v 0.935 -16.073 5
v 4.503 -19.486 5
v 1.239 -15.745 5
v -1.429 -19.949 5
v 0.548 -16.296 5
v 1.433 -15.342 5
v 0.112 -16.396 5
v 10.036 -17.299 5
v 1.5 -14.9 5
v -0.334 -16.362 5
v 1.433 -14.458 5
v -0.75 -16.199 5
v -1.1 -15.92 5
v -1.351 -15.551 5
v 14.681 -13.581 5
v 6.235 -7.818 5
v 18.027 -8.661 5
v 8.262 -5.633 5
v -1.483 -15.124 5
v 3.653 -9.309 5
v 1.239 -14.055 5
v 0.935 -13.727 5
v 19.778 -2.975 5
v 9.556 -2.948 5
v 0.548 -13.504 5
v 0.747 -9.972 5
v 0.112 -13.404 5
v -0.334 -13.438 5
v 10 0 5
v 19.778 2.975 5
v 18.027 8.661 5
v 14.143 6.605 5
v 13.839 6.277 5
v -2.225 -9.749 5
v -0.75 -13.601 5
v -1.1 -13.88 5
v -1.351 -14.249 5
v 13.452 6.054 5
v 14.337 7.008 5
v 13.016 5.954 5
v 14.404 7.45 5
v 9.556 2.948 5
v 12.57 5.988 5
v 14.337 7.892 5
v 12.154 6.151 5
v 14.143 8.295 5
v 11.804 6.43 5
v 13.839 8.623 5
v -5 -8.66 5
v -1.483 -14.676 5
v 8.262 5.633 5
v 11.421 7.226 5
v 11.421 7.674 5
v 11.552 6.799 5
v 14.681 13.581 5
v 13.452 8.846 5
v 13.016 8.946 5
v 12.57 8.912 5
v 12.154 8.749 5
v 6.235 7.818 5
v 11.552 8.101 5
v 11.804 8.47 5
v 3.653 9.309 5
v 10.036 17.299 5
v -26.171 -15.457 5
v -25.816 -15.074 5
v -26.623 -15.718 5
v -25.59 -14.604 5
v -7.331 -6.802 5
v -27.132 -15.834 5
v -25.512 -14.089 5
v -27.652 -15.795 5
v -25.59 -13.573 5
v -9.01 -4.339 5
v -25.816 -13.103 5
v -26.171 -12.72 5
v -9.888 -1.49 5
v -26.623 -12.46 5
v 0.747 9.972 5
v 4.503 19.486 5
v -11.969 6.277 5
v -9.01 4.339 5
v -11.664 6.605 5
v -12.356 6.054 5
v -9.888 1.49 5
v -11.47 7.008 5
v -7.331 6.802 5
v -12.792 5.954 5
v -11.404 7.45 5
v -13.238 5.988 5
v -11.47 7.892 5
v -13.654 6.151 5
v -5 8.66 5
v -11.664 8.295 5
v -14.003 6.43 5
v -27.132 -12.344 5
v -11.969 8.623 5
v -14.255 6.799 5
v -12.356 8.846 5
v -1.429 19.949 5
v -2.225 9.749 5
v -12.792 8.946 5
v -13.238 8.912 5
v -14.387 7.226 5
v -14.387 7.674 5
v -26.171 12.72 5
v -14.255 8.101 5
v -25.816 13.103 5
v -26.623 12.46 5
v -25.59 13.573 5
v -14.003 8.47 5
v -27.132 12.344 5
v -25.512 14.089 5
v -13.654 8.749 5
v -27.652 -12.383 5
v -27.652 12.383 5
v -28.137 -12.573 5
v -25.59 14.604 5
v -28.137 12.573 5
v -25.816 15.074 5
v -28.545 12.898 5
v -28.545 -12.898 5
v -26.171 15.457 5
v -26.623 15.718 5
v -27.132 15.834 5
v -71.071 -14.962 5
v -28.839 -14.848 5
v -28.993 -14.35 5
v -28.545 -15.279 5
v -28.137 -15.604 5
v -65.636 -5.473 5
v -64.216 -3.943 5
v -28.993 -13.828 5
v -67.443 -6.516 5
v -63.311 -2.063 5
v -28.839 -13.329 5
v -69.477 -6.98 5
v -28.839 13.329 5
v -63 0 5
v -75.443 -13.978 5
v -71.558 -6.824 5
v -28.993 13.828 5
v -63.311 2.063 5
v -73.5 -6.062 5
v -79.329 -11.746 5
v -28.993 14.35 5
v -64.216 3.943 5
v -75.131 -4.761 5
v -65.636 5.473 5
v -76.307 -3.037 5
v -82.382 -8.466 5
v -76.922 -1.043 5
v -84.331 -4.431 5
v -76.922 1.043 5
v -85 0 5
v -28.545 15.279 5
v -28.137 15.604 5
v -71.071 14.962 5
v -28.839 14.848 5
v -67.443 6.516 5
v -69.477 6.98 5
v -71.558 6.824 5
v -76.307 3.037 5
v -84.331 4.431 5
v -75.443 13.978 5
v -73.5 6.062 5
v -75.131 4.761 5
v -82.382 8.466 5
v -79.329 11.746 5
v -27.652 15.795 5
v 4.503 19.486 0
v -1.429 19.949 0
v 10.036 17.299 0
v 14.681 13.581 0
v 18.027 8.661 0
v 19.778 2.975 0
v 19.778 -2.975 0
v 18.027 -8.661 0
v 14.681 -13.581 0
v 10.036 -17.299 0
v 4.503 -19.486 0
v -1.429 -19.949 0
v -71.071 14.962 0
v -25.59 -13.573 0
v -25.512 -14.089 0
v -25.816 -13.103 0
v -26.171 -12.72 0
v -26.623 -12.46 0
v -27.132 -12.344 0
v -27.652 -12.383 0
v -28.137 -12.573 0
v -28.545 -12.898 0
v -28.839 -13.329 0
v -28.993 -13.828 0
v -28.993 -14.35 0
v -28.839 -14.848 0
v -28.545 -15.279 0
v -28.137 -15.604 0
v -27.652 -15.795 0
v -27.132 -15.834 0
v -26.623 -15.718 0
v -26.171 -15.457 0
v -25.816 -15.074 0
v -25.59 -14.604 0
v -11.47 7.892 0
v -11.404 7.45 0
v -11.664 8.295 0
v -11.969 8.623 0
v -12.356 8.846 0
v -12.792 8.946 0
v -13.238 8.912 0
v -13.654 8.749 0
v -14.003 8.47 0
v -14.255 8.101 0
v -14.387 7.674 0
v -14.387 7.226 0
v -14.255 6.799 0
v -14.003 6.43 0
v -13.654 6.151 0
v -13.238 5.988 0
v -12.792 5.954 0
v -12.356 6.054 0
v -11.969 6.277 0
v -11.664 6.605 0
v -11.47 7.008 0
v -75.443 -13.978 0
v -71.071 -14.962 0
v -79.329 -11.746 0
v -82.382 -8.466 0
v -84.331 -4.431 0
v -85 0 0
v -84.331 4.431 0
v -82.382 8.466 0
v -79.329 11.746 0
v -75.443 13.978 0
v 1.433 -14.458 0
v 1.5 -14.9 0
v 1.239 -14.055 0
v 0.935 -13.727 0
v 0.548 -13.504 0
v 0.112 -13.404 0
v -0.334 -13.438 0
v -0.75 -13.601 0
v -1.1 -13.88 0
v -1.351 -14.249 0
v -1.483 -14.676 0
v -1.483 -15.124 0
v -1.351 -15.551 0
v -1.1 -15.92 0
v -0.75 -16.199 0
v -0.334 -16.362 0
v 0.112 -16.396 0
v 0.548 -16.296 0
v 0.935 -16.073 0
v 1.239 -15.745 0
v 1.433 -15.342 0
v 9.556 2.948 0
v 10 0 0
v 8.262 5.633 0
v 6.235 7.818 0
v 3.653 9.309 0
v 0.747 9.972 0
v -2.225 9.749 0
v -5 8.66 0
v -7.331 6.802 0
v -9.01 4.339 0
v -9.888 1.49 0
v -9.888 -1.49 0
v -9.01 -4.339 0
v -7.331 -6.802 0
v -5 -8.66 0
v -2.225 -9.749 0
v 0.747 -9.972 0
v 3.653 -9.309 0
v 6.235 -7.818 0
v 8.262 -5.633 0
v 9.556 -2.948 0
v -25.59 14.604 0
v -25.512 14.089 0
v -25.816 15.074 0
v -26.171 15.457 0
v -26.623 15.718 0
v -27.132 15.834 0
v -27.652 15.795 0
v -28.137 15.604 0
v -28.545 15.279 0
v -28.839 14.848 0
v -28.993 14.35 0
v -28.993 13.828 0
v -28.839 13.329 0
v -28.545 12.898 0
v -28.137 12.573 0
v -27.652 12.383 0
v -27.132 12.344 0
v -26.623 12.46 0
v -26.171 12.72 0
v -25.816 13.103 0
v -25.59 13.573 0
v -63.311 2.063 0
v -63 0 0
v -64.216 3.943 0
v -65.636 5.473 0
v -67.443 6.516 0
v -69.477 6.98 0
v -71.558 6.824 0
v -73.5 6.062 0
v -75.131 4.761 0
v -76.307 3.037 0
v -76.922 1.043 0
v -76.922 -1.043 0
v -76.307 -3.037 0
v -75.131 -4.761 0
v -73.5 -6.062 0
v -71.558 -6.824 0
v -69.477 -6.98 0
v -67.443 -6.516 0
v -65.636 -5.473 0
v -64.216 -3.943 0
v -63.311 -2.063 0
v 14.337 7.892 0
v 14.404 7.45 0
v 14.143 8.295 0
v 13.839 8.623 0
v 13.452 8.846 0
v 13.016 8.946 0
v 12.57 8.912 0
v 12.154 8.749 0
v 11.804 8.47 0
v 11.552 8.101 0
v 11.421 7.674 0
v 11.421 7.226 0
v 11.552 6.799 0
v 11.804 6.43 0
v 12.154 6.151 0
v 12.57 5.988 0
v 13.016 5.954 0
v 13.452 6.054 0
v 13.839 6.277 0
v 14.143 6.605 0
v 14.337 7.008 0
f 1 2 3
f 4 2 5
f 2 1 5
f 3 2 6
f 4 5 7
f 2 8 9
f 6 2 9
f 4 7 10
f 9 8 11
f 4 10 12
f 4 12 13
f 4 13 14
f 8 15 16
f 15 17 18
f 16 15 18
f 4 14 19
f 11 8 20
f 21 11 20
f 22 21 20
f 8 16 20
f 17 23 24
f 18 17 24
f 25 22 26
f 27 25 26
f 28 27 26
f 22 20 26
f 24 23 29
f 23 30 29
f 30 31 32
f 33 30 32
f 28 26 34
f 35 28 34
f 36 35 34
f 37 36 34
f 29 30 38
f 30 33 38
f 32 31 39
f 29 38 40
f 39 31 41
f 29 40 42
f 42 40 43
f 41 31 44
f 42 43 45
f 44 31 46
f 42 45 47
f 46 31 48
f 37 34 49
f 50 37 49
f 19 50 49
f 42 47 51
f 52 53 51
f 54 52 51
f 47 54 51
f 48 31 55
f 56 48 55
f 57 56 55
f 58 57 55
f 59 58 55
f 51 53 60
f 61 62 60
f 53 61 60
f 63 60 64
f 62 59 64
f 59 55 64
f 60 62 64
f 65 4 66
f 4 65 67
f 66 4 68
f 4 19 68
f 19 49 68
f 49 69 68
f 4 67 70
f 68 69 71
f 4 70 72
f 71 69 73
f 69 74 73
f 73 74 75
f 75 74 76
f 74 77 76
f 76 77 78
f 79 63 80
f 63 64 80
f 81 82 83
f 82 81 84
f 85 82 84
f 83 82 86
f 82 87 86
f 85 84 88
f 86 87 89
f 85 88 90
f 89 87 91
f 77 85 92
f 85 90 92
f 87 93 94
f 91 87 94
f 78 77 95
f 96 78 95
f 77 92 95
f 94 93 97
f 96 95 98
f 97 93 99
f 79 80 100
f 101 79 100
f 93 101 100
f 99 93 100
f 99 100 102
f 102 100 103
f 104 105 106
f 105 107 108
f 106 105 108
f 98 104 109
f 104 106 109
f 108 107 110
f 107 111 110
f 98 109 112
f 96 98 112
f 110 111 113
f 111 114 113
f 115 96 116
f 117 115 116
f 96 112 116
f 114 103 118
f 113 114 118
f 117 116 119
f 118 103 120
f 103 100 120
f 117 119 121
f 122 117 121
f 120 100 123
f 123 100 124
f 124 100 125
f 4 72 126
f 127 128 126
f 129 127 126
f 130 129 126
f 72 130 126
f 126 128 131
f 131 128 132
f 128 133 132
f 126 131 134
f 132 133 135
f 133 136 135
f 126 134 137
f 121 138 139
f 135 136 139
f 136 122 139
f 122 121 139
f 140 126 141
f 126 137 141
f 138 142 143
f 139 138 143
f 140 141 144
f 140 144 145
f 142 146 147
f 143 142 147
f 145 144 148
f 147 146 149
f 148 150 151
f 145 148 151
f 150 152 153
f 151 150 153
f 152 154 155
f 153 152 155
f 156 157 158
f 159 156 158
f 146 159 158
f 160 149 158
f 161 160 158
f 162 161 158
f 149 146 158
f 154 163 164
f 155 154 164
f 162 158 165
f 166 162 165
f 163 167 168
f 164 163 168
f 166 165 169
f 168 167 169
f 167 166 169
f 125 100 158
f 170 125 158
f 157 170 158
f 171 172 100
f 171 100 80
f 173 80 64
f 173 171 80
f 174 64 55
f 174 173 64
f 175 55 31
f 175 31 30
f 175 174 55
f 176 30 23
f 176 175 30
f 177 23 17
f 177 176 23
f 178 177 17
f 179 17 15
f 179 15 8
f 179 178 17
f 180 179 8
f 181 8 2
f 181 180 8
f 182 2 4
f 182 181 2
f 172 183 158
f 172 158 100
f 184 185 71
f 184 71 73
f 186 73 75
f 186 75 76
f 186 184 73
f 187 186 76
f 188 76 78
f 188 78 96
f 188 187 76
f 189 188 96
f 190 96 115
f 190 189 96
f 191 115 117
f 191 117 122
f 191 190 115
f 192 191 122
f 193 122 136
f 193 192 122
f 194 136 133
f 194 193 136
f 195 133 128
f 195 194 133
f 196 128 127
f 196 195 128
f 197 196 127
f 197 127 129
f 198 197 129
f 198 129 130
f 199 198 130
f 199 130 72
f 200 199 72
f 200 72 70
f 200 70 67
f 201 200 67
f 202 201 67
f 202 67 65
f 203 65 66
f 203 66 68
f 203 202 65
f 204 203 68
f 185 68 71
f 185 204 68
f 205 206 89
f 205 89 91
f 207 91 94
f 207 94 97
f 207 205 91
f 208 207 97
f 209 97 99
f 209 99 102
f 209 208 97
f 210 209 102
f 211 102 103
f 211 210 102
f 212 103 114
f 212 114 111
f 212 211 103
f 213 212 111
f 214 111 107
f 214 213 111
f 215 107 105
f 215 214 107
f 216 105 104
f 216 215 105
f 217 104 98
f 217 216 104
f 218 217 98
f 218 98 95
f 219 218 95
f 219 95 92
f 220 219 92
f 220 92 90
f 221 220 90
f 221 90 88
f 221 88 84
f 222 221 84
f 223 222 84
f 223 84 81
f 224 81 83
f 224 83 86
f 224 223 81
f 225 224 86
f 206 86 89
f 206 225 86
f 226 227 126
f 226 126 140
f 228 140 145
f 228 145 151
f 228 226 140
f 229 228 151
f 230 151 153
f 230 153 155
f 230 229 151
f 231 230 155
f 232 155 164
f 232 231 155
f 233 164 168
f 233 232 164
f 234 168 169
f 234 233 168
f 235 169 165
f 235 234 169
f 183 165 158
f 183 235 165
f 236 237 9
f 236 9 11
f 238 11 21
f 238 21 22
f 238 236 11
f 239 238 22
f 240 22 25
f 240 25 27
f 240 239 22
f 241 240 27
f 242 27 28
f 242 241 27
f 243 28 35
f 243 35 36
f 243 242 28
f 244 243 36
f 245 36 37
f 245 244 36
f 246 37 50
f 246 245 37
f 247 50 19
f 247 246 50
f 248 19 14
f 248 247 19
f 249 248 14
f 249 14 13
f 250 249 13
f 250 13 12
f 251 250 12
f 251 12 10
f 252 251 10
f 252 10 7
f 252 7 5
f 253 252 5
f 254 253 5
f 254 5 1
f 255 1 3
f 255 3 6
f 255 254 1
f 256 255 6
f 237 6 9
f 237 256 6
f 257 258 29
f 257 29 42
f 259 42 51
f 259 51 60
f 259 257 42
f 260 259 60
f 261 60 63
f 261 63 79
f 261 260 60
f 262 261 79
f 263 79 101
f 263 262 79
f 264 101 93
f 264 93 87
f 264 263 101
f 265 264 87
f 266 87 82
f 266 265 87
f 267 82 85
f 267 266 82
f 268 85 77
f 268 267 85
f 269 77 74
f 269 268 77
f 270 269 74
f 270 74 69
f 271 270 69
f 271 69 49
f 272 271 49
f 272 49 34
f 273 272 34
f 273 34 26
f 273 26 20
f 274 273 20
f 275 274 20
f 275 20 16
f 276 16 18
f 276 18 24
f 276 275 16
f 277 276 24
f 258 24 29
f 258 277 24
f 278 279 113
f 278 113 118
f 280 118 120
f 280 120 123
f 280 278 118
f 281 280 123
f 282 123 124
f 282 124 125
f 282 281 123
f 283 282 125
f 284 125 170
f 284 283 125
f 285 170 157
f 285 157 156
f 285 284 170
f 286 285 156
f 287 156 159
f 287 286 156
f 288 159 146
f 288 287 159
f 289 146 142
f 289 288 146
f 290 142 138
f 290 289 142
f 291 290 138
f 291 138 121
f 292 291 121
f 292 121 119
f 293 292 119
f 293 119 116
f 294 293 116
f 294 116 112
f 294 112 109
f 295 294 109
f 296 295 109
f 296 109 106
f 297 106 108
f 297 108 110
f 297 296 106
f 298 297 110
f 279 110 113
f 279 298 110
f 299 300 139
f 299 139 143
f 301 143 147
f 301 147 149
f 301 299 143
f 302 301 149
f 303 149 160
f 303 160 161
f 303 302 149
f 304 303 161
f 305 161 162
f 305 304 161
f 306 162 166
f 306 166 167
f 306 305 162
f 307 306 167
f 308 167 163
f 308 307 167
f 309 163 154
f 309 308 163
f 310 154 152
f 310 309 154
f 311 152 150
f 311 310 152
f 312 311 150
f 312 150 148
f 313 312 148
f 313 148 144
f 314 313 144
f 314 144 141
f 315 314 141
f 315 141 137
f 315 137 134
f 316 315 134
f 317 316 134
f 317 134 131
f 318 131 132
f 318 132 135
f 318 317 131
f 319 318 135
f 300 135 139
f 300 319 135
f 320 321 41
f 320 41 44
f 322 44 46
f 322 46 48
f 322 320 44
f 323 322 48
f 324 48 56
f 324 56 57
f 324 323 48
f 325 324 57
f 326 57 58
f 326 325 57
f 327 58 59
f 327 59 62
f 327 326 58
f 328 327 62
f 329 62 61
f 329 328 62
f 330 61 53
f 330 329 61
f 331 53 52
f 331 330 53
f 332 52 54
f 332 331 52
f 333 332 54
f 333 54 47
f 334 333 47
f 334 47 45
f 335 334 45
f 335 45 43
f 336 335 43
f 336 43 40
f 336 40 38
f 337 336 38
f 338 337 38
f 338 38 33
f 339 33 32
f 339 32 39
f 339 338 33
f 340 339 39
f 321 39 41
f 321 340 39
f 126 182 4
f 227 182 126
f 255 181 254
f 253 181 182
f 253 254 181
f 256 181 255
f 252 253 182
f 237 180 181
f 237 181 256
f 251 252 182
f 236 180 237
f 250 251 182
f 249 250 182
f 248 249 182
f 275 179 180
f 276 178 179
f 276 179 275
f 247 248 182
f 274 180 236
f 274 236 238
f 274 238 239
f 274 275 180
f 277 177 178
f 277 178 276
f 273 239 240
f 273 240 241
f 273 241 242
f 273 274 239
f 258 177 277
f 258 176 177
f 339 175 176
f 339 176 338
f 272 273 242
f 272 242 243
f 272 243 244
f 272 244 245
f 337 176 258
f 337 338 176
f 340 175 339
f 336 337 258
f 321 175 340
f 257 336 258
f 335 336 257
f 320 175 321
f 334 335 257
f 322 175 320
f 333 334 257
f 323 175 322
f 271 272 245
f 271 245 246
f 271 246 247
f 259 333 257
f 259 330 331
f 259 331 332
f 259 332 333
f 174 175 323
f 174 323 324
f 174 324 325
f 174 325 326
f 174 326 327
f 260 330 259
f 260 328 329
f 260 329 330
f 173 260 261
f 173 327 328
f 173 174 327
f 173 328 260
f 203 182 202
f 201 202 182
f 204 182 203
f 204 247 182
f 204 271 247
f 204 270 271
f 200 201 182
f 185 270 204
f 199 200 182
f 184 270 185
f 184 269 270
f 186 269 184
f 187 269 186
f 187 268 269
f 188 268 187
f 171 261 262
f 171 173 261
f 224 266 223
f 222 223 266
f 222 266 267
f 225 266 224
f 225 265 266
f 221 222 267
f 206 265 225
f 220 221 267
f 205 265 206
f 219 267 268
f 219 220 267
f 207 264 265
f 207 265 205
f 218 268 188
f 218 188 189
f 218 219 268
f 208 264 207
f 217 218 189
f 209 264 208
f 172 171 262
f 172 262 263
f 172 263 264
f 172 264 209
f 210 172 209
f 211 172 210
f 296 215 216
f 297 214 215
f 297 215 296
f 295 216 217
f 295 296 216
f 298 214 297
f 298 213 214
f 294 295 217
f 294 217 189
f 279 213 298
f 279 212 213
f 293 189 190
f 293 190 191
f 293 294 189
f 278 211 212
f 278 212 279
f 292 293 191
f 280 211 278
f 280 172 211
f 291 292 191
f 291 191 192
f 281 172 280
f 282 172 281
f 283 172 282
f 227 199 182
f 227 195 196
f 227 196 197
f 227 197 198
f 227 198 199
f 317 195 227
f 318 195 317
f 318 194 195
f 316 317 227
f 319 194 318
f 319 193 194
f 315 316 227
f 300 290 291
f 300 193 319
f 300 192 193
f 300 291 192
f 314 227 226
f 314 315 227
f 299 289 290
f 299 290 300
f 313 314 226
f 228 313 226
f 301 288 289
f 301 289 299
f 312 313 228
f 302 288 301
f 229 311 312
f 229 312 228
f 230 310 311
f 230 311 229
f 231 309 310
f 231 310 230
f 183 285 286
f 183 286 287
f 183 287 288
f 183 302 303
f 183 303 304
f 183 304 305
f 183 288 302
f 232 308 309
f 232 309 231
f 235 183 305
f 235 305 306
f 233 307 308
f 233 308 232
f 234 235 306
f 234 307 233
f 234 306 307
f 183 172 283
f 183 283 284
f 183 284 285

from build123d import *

# Parameters (mm, degrees)
SKETCH1_R           = 7
SKETCH1_R_2         = 10
SKETCH1_R_3         = 1.5
SKETCH1_R_4         = 1.75
BOSS_EXTRUDE1_DEPTH = 5


with BuildPart() as part:
    # Sketch1 → Boss-Extrude1 (new body)
    with BuildSketch(Plane.XY):
        with BuildLine():
            Line((-71.071428571, 14.961685761), (-1.428571429, 19.948914348))
            ThreePointArc((-1.428571429, 19.948914348), (20, 0), (-1.428571429, -19.948914348))
            Line((-1.428571429, -19.948914348), (-71.071428571, -14.961685761))
            ThreePointArc((-71.071428571, -14.961685761), (-85, 0), (-71.071428571, 14.961685761))
        make_face()
        with Locations((-70, 0)):
            Circle(SKETCH1_R, mode=Mode.SUBTRACT)
        Circle(SKETCH1_R_2, mode=Mode.SUBTRACT)
        with Locations((-12.903778516, 7.45)):
            Circle(SKETCH1_R_3, mode=Mode.SUBTRACT)
        with Locations((0, -14.9)):
            Circle(SKETCH1_R_3, mode=Mode.SUBTRACT)
        with Locations((-27.262321561, 14.088677781)):
            Circle(SKETCH1_R_4, mode=Mode.SUBTRACT)
        with Locations((-27.262321561, -14.088677781)):
            Circle(SKETCH1_R_4, mode=Mode.SUBTRACT)
        with Locations((12.903778516, 7.45)):
            Circle(SKETCH1_R_3, mode=Mode.SUBTRACT)
    extrude(amount=BOSS_EXTRUDE1_DEPTH)


solid = part.part
